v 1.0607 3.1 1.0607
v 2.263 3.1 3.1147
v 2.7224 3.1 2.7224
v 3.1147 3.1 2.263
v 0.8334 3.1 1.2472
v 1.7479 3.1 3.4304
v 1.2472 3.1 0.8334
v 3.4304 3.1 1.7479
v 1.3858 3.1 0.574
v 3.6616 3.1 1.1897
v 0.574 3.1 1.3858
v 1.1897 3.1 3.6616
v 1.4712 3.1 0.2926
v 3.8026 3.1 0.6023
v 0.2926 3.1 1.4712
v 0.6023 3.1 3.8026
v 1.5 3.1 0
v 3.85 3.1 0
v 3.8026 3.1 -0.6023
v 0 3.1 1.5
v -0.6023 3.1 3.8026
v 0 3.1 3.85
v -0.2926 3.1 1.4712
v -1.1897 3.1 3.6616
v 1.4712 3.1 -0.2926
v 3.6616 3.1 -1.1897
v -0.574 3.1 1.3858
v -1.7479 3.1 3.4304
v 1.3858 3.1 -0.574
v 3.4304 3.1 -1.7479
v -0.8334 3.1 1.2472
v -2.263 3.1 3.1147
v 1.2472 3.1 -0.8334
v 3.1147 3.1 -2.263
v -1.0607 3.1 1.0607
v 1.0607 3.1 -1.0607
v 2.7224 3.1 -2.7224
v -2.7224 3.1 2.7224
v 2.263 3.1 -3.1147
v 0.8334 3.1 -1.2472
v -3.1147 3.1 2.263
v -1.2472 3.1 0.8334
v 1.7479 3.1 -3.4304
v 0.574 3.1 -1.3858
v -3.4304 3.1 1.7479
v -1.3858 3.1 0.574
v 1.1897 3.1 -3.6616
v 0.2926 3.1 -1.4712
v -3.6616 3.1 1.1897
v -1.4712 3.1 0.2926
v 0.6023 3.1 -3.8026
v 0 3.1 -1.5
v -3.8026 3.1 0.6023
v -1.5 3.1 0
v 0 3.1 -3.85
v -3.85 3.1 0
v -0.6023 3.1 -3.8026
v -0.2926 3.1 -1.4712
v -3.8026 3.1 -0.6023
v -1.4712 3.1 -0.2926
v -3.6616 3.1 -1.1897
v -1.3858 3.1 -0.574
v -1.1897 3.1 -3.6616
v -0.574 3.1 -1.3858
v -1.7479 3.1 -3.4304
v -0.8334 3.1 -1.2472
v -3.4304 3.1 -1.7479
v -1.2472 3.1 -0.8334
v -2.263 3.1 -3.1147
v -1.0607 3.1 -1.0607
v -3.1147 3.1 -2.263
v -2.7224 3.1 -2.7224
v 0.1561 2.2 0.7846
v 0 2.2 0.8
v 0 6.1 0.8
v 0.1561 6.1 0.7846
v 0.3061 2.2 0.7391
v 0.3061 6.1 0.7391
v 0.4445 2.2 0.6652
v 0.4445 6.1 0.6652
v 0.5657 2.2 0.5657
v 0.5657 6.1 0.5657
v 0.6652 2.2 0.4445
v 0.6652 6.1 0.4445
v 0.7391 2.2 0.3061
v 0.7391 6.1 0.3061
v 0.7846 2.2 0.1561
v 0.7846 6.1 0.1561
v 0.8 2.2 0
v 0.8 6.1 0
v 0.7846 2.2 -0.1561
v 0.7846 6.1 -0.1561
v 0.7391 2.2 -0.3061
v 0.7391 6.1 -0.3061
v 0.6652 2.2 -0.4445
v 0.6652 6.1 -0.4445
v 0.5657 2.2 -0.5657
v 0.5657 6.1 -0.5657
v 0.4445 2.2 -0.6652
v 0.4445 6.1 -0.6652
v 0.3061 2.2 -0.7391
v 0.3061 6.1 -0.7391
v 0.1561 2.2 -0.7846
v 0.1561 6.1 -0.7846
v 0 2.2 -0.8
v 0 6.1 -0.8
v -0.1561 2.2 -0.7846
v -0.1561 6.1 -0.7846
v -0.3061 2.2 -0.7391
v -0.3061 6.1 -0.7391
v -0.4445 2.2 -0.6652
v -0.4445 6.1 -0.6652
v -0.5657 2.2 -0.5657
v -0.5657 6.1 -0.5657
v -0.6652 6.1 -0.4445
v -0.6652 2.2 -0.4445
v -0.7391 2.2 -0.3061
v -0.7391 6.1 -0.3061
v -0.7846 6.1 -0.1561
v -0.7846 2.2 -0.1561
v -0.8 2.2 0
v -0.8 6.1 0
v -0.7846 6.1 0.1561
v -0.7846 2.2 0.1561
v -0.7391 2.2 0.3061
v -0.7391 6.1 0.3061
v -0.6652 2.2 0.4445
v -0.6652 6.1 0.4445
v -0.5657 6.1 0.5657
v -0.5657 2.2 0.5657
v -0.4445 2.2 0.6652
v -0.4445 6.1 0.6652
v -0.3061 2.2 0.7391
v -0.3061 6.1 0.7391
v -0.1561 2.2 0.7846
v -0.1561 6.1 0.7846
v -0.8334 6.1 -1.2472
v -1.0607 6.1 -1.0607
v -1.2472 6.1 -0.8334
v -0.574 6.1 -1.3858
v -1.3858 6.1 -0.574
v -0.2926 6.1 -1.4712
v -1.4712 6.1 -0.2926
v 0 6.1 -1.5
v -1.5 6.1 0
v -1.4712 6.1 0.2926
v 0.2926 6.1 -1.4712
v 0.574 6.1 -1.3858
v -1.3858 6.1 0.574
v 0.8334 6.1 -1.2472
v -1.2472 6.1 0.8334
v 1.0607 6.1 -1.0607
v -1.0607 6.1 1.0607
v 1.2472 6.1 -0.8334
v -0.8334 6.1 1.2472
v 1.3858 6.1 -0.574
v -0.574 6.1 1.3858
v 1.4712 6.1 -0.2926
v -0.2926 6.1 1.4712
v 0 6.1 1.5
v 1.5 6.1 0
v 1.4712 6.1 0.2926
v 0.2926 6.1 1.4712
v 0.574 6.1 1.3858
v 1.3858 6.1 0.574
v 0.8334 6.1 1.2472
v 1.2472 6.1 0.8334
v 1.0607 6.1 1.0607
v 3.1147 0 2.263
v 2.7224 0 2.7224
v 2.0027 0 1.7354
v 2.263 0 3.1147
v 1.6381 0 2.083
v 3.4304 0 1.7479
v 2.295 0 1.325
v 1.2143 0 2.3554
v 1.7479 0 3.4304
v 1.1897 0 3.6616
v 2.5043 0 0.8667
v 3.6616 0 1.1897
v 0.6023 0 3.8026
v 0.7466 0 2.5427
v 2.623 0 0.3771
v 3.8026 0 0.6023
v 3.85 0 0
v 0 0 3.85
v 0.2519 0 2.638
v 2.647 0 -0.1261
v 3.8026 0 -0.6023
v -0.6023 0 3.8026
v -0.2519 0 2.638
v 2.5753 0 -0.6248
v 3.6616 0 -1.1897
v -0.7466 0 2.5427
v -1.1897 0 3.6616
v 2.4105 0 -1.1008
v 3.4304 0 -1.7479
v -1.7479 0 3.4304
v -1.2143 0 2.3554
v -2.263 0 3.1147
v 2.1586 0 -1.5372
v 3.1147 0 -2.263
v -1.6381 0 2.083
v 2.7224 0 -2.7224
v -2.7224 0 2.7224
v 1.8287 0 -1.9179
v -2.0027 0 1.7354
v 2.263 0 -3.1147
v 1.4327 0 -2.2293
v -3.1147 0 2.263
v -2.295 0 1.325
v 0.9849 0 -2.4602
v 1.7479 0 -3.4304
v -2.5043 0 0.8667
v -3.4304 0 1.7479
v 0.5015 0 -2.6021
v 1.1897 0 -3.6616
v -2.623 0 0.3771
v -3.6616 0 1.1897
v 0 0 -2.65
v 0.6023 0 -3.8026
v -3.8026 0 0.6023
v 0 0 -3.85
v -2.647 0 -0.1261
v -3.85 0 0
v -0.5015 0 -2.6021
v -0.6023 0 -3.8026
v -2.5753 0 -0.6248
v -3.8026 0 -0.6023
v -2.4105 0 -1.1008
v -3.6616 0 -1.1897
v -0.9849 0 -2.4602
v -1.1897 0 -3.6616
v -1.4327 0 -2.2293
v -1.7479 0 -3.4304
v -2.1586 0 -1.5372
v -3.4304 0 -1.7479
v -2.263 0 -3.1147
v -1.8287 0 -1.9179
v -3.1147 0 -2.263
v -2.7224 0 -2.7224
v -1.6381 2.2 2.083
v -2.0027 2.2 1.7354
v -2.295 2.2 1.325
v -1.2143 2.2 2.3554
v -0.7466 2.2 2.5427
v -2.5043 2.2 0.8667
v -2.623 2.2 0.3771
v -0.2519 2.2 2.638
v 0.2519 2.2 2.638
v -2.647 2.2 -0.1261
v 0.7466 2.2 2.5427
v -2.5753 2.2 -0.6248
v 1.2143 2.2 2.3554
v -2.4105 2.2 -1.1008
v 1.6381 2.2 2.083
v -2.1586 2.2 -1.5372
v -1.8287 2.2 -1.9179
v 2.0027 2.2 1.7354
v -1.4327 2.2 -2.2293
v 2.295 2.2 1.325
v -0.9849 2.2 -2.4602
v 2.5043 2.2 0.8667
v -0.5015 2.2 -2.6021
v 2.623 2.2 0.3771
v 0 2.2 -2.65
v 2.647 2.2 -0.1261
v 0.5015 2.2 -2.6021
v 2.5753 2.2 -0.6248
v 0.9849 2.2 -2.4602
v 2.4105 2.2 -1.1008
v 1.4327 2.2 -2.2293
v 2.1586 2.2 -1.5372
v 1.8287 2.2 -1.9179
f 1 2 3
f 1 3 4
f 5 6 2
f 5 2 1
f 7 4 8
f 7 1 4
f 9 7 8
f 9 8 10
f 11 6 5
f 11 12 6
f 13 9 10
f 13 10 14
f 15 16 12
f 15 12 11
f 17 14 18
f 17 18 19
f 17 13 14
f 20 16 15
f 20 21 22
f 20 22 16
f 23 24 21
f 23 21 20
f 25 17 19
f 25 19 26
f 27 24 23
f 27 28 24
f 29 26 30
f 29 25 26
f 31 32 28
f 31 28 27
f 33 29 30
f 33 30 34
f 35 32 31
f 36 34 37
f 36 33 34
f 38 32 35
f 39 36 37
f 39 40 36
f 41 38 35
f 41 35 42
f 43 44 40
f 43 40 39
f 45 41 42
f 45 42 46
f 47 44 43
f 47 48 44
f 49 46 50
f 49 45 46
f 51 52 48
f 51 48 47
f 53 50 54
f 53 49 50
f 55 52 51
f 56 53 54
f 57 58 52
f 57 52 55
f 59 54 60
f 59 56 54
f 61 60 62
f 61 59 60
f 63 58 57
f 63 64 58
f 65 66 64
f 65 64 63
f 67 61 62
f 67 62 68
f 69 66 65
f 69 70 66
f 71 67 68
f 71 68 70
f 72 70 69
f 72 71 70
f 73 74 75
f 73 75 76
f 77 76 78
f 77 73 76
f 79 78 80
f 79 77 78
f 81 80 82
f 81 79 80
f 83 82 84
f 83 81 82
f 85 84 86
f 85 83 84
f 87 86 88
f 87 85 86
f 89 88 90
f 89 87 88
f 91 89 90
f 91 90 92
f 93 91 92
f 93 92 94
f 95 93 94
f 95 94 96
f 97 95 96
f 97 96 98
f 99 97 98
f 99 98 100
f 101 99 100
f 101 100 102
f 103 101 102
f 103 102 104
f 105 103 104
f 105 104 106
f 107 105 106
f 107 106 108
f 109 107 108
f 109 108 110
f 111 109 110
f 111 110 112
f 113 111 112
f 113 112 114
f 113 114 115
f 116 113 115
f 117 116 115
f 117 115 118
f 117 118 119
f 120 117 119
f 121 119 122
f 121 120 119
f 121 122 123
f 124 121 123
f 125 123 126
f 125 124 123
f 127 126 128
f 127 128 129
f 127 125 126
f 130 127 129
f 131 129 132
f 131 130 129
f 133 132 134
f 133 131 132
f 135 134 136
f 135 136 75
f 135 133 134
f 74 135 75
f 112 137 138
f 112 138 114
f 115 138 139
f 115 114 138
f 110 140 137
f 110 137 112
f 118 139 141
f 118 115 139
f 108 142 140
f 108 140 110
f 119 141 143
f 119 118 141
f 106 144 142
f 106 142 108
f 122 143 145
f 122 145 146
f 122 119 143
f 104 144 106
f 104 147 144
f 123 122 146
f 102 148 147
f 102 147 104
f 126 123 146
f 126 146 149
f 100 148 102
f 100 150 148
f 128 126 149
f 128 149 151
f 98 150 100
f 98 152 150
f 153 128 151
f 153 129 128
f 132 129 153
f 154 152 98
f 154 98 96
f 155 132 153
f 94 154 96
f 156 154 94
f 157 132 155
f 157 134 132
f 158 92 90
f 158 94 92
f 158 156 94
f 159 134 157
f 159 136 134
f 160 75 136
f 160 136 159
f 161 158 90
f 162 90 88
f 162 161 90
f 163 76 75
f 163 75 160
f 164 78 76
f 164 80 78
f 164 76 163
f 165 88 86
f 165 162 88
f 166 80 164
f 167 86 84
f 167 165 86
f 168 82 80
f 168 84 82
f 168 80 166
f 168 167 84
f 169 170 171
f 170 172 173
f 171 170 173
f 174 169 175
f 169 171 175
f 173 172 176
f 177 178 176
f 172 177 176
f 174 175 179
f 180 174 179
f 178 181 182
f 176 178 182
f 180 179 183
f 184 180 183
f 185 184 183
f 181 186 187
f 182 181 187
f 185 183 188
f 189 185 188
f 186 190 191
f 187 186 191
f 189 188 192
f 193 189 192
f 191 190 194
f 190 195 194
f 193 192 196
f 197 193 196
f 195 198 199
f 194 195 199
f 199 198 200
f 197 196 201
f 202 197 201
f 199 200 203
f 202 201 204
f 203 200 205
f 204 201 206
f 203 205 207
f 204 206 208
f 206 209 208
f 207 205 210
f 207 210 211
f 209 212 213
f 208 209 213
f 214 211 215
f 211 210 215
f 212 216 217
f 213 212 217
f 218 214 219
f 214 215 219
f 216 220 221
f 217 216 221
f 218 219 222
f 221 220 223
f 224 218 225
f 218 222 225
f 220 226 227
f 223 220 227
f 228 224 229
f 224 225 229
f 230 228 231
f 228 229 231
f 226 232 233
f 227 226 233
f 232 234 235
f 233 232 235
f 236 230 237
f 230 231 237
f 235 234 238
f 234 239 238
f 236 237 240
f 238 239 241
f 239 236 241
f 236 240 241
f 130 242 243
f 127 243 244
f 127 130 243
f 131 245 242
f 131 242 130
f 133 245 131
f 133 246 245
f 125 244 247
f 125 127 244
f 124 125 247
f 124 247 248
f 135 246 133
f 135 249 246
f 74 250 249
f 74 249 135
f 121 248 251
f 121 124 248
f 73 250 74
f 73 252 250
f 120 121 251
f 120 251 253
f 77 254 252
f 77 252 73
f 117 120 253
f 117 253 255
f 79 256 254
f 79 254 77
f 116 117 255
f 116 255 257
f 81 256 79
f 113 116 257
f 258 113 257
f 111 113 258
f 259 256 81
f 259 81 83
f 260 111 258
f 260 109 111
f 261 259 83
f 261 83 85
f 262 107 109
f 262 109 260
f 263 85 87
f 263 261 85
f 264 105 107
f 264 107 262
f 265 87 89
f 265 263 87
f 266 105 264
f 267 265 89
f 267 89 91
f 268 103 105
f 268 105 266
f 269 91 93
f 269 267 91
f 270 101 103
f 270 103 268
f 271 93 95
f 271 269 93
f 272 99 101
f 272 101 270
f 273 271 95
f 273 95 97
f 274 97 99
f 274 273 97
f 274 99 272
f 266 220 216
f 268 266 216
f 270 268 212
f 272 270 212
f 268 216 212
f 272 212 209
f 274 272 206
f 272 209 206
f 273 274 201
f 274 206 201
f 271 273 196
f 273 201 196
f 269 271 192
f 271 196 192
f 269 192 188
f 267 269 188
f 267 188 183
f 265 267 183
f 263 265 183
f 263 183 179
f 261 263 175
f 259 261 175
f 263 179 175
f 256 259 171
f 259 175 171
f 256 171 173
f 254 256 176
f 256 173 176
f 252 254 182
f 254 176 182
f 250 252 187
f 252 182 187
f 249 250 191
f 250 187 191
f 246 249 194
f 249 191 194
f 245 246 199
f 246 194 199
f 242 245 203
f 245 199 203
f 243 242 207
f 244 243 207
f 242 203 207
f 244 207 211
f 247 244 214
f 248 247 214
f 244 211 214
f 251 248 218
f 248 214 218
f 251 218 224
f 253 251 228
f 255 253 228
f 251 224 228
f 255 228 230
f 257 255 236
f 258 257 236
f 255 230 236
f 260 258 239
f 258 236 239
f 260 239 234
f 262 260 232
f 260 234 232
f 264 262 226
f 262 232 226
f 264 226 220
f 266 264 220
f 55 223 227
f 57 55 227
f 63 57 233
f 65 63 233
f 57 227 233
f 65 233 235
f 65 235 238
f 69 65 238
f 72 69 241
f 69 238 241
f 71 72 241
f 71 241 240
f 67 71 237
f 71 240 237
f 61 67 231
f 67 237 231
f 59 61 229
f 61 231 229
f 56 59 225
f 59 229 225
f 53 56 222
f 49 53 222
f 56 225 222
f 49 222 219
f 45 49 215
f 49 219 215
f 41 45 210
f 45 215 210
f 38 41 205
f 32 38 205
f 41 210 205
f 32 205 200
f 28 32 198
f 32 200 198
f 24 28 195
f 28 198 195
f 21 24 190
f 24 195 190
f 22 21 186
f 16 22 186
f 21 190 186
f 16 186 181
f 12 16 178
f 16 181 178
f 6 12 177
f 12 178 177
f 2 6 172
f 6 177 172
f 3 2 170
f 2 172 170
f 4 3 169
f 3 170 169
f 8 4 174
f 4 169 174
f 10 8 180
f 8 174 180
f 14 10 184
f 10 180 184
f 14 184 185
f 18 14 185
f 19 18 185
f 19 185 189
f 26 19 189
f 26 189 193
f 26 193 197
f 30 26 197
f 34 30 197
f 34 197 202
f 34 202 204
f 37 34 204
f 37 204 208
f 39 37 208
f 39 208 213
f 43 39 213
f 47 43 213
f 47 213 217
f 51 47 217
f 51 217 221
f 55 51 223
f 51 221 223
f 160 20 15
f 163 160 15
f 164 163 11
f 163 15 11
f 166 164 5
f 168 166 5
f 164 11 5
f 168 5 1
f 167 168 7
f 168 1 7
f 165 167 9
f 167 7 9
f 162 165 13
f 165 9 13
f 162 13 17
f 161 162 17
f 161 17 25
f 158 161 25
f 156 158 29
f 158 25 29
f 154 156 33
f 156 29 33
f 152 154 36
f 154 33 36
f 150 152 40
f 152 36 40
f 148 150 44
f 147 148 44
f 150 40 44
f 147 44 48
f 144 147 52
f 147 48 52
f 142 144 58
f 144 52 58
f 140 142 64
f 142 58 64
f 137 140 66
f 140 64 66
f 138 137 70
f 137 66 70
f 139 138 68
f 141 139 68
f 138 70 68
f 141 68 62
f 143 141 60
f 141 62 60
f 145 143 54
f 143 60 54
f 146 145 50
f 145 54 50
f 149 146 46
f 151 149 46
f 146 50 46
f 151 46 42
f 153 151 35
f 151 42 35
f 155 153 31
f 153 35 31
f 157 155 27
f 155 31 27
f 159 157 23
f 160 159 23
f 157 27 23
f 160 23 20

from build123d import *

# Parameters (mm, degrees)
SKETCH1_R               = 3.85
BOSS_EXTRUDE1_DEPTH     = 3.1
SKETCH2_R               = 1.5
SKETCH2_R_2             = 0.8
BOSS_EXTRUDE2_DEPTH     = 3
CUT_EXTRUDE1_DEPTH      = 7.265381074
CUT_EXTRUDE1_DEPTH_BACK = 7.265381074
SKETCH3_R               = 0.8
SKETCH4_R               = 2.65
CUT_EXTRUDE2_DEPTH      = 2.2


with BuildPart() as part:
    # Sketch1 → Boss-Extrude1 (new body)
    with BuildSketch(Plane(origin=(0, 0, 0), x_dir=(1, 0, 0), z_dir=(0, 1, 0))):
        with Locations(Location((0, 0, 0), (0, 0, 90))):
            Circle(SKETCH1_R)
    extrude(amount=BOSS_EXTRUDE1_DEPTH)

    # Sketch2 → Boss-Extrude2 (add)
    with BuildSketch(Plane(origin=(0, 3.1, 0), x_dir=(1, 0, 0), z_dir=(0, 1, 0))):
        with Locations(Location((0, 0, 0), (0, 0, 270))):
            Circle(SKETCH2_R)
        with Locations(Location((0, 0, 0), (0, 0, 270))):
            Circle(SKETCH2_R_2, mode=Mode.SUBTRACT)
    extrude(amount=BOSS_EXTRUDE2_DEPTH)

    # Sketch3 → Cut-Extrude1 (cut, two sides: drawn at the far end of the back side and taken through both)
    with BuildSketch(Plane(origin=(0, 3.1, 0), x_dir=(1, 0, 0), z_dir=(0, 1, 0)).offset(-CUT_EXTRUDE1_DEPTH_BACK)):
        with Locations(Location((0, 0, 0), (0, 0, 270))):
            Circle(SKETCH3_R)
    extrude(amount=CUT_EXTRUDE1_DEPTH + CUT_EXTRUDE1_DEPTH_BACK, mode=Mode.SUBTRACT)

    # Sketch4 → Cut-Extrude2 (cut)
    with BuildSketch(Plane.XZ):
        with Locations(Location((0, 0, 0), (0, 0, 270))):
            Circle(SKETCH4_R)
    extrude(amount=-CUT_EXTRUDE2_DEPTH, mode=Mode.SUBTRACT)


solid = part.part
